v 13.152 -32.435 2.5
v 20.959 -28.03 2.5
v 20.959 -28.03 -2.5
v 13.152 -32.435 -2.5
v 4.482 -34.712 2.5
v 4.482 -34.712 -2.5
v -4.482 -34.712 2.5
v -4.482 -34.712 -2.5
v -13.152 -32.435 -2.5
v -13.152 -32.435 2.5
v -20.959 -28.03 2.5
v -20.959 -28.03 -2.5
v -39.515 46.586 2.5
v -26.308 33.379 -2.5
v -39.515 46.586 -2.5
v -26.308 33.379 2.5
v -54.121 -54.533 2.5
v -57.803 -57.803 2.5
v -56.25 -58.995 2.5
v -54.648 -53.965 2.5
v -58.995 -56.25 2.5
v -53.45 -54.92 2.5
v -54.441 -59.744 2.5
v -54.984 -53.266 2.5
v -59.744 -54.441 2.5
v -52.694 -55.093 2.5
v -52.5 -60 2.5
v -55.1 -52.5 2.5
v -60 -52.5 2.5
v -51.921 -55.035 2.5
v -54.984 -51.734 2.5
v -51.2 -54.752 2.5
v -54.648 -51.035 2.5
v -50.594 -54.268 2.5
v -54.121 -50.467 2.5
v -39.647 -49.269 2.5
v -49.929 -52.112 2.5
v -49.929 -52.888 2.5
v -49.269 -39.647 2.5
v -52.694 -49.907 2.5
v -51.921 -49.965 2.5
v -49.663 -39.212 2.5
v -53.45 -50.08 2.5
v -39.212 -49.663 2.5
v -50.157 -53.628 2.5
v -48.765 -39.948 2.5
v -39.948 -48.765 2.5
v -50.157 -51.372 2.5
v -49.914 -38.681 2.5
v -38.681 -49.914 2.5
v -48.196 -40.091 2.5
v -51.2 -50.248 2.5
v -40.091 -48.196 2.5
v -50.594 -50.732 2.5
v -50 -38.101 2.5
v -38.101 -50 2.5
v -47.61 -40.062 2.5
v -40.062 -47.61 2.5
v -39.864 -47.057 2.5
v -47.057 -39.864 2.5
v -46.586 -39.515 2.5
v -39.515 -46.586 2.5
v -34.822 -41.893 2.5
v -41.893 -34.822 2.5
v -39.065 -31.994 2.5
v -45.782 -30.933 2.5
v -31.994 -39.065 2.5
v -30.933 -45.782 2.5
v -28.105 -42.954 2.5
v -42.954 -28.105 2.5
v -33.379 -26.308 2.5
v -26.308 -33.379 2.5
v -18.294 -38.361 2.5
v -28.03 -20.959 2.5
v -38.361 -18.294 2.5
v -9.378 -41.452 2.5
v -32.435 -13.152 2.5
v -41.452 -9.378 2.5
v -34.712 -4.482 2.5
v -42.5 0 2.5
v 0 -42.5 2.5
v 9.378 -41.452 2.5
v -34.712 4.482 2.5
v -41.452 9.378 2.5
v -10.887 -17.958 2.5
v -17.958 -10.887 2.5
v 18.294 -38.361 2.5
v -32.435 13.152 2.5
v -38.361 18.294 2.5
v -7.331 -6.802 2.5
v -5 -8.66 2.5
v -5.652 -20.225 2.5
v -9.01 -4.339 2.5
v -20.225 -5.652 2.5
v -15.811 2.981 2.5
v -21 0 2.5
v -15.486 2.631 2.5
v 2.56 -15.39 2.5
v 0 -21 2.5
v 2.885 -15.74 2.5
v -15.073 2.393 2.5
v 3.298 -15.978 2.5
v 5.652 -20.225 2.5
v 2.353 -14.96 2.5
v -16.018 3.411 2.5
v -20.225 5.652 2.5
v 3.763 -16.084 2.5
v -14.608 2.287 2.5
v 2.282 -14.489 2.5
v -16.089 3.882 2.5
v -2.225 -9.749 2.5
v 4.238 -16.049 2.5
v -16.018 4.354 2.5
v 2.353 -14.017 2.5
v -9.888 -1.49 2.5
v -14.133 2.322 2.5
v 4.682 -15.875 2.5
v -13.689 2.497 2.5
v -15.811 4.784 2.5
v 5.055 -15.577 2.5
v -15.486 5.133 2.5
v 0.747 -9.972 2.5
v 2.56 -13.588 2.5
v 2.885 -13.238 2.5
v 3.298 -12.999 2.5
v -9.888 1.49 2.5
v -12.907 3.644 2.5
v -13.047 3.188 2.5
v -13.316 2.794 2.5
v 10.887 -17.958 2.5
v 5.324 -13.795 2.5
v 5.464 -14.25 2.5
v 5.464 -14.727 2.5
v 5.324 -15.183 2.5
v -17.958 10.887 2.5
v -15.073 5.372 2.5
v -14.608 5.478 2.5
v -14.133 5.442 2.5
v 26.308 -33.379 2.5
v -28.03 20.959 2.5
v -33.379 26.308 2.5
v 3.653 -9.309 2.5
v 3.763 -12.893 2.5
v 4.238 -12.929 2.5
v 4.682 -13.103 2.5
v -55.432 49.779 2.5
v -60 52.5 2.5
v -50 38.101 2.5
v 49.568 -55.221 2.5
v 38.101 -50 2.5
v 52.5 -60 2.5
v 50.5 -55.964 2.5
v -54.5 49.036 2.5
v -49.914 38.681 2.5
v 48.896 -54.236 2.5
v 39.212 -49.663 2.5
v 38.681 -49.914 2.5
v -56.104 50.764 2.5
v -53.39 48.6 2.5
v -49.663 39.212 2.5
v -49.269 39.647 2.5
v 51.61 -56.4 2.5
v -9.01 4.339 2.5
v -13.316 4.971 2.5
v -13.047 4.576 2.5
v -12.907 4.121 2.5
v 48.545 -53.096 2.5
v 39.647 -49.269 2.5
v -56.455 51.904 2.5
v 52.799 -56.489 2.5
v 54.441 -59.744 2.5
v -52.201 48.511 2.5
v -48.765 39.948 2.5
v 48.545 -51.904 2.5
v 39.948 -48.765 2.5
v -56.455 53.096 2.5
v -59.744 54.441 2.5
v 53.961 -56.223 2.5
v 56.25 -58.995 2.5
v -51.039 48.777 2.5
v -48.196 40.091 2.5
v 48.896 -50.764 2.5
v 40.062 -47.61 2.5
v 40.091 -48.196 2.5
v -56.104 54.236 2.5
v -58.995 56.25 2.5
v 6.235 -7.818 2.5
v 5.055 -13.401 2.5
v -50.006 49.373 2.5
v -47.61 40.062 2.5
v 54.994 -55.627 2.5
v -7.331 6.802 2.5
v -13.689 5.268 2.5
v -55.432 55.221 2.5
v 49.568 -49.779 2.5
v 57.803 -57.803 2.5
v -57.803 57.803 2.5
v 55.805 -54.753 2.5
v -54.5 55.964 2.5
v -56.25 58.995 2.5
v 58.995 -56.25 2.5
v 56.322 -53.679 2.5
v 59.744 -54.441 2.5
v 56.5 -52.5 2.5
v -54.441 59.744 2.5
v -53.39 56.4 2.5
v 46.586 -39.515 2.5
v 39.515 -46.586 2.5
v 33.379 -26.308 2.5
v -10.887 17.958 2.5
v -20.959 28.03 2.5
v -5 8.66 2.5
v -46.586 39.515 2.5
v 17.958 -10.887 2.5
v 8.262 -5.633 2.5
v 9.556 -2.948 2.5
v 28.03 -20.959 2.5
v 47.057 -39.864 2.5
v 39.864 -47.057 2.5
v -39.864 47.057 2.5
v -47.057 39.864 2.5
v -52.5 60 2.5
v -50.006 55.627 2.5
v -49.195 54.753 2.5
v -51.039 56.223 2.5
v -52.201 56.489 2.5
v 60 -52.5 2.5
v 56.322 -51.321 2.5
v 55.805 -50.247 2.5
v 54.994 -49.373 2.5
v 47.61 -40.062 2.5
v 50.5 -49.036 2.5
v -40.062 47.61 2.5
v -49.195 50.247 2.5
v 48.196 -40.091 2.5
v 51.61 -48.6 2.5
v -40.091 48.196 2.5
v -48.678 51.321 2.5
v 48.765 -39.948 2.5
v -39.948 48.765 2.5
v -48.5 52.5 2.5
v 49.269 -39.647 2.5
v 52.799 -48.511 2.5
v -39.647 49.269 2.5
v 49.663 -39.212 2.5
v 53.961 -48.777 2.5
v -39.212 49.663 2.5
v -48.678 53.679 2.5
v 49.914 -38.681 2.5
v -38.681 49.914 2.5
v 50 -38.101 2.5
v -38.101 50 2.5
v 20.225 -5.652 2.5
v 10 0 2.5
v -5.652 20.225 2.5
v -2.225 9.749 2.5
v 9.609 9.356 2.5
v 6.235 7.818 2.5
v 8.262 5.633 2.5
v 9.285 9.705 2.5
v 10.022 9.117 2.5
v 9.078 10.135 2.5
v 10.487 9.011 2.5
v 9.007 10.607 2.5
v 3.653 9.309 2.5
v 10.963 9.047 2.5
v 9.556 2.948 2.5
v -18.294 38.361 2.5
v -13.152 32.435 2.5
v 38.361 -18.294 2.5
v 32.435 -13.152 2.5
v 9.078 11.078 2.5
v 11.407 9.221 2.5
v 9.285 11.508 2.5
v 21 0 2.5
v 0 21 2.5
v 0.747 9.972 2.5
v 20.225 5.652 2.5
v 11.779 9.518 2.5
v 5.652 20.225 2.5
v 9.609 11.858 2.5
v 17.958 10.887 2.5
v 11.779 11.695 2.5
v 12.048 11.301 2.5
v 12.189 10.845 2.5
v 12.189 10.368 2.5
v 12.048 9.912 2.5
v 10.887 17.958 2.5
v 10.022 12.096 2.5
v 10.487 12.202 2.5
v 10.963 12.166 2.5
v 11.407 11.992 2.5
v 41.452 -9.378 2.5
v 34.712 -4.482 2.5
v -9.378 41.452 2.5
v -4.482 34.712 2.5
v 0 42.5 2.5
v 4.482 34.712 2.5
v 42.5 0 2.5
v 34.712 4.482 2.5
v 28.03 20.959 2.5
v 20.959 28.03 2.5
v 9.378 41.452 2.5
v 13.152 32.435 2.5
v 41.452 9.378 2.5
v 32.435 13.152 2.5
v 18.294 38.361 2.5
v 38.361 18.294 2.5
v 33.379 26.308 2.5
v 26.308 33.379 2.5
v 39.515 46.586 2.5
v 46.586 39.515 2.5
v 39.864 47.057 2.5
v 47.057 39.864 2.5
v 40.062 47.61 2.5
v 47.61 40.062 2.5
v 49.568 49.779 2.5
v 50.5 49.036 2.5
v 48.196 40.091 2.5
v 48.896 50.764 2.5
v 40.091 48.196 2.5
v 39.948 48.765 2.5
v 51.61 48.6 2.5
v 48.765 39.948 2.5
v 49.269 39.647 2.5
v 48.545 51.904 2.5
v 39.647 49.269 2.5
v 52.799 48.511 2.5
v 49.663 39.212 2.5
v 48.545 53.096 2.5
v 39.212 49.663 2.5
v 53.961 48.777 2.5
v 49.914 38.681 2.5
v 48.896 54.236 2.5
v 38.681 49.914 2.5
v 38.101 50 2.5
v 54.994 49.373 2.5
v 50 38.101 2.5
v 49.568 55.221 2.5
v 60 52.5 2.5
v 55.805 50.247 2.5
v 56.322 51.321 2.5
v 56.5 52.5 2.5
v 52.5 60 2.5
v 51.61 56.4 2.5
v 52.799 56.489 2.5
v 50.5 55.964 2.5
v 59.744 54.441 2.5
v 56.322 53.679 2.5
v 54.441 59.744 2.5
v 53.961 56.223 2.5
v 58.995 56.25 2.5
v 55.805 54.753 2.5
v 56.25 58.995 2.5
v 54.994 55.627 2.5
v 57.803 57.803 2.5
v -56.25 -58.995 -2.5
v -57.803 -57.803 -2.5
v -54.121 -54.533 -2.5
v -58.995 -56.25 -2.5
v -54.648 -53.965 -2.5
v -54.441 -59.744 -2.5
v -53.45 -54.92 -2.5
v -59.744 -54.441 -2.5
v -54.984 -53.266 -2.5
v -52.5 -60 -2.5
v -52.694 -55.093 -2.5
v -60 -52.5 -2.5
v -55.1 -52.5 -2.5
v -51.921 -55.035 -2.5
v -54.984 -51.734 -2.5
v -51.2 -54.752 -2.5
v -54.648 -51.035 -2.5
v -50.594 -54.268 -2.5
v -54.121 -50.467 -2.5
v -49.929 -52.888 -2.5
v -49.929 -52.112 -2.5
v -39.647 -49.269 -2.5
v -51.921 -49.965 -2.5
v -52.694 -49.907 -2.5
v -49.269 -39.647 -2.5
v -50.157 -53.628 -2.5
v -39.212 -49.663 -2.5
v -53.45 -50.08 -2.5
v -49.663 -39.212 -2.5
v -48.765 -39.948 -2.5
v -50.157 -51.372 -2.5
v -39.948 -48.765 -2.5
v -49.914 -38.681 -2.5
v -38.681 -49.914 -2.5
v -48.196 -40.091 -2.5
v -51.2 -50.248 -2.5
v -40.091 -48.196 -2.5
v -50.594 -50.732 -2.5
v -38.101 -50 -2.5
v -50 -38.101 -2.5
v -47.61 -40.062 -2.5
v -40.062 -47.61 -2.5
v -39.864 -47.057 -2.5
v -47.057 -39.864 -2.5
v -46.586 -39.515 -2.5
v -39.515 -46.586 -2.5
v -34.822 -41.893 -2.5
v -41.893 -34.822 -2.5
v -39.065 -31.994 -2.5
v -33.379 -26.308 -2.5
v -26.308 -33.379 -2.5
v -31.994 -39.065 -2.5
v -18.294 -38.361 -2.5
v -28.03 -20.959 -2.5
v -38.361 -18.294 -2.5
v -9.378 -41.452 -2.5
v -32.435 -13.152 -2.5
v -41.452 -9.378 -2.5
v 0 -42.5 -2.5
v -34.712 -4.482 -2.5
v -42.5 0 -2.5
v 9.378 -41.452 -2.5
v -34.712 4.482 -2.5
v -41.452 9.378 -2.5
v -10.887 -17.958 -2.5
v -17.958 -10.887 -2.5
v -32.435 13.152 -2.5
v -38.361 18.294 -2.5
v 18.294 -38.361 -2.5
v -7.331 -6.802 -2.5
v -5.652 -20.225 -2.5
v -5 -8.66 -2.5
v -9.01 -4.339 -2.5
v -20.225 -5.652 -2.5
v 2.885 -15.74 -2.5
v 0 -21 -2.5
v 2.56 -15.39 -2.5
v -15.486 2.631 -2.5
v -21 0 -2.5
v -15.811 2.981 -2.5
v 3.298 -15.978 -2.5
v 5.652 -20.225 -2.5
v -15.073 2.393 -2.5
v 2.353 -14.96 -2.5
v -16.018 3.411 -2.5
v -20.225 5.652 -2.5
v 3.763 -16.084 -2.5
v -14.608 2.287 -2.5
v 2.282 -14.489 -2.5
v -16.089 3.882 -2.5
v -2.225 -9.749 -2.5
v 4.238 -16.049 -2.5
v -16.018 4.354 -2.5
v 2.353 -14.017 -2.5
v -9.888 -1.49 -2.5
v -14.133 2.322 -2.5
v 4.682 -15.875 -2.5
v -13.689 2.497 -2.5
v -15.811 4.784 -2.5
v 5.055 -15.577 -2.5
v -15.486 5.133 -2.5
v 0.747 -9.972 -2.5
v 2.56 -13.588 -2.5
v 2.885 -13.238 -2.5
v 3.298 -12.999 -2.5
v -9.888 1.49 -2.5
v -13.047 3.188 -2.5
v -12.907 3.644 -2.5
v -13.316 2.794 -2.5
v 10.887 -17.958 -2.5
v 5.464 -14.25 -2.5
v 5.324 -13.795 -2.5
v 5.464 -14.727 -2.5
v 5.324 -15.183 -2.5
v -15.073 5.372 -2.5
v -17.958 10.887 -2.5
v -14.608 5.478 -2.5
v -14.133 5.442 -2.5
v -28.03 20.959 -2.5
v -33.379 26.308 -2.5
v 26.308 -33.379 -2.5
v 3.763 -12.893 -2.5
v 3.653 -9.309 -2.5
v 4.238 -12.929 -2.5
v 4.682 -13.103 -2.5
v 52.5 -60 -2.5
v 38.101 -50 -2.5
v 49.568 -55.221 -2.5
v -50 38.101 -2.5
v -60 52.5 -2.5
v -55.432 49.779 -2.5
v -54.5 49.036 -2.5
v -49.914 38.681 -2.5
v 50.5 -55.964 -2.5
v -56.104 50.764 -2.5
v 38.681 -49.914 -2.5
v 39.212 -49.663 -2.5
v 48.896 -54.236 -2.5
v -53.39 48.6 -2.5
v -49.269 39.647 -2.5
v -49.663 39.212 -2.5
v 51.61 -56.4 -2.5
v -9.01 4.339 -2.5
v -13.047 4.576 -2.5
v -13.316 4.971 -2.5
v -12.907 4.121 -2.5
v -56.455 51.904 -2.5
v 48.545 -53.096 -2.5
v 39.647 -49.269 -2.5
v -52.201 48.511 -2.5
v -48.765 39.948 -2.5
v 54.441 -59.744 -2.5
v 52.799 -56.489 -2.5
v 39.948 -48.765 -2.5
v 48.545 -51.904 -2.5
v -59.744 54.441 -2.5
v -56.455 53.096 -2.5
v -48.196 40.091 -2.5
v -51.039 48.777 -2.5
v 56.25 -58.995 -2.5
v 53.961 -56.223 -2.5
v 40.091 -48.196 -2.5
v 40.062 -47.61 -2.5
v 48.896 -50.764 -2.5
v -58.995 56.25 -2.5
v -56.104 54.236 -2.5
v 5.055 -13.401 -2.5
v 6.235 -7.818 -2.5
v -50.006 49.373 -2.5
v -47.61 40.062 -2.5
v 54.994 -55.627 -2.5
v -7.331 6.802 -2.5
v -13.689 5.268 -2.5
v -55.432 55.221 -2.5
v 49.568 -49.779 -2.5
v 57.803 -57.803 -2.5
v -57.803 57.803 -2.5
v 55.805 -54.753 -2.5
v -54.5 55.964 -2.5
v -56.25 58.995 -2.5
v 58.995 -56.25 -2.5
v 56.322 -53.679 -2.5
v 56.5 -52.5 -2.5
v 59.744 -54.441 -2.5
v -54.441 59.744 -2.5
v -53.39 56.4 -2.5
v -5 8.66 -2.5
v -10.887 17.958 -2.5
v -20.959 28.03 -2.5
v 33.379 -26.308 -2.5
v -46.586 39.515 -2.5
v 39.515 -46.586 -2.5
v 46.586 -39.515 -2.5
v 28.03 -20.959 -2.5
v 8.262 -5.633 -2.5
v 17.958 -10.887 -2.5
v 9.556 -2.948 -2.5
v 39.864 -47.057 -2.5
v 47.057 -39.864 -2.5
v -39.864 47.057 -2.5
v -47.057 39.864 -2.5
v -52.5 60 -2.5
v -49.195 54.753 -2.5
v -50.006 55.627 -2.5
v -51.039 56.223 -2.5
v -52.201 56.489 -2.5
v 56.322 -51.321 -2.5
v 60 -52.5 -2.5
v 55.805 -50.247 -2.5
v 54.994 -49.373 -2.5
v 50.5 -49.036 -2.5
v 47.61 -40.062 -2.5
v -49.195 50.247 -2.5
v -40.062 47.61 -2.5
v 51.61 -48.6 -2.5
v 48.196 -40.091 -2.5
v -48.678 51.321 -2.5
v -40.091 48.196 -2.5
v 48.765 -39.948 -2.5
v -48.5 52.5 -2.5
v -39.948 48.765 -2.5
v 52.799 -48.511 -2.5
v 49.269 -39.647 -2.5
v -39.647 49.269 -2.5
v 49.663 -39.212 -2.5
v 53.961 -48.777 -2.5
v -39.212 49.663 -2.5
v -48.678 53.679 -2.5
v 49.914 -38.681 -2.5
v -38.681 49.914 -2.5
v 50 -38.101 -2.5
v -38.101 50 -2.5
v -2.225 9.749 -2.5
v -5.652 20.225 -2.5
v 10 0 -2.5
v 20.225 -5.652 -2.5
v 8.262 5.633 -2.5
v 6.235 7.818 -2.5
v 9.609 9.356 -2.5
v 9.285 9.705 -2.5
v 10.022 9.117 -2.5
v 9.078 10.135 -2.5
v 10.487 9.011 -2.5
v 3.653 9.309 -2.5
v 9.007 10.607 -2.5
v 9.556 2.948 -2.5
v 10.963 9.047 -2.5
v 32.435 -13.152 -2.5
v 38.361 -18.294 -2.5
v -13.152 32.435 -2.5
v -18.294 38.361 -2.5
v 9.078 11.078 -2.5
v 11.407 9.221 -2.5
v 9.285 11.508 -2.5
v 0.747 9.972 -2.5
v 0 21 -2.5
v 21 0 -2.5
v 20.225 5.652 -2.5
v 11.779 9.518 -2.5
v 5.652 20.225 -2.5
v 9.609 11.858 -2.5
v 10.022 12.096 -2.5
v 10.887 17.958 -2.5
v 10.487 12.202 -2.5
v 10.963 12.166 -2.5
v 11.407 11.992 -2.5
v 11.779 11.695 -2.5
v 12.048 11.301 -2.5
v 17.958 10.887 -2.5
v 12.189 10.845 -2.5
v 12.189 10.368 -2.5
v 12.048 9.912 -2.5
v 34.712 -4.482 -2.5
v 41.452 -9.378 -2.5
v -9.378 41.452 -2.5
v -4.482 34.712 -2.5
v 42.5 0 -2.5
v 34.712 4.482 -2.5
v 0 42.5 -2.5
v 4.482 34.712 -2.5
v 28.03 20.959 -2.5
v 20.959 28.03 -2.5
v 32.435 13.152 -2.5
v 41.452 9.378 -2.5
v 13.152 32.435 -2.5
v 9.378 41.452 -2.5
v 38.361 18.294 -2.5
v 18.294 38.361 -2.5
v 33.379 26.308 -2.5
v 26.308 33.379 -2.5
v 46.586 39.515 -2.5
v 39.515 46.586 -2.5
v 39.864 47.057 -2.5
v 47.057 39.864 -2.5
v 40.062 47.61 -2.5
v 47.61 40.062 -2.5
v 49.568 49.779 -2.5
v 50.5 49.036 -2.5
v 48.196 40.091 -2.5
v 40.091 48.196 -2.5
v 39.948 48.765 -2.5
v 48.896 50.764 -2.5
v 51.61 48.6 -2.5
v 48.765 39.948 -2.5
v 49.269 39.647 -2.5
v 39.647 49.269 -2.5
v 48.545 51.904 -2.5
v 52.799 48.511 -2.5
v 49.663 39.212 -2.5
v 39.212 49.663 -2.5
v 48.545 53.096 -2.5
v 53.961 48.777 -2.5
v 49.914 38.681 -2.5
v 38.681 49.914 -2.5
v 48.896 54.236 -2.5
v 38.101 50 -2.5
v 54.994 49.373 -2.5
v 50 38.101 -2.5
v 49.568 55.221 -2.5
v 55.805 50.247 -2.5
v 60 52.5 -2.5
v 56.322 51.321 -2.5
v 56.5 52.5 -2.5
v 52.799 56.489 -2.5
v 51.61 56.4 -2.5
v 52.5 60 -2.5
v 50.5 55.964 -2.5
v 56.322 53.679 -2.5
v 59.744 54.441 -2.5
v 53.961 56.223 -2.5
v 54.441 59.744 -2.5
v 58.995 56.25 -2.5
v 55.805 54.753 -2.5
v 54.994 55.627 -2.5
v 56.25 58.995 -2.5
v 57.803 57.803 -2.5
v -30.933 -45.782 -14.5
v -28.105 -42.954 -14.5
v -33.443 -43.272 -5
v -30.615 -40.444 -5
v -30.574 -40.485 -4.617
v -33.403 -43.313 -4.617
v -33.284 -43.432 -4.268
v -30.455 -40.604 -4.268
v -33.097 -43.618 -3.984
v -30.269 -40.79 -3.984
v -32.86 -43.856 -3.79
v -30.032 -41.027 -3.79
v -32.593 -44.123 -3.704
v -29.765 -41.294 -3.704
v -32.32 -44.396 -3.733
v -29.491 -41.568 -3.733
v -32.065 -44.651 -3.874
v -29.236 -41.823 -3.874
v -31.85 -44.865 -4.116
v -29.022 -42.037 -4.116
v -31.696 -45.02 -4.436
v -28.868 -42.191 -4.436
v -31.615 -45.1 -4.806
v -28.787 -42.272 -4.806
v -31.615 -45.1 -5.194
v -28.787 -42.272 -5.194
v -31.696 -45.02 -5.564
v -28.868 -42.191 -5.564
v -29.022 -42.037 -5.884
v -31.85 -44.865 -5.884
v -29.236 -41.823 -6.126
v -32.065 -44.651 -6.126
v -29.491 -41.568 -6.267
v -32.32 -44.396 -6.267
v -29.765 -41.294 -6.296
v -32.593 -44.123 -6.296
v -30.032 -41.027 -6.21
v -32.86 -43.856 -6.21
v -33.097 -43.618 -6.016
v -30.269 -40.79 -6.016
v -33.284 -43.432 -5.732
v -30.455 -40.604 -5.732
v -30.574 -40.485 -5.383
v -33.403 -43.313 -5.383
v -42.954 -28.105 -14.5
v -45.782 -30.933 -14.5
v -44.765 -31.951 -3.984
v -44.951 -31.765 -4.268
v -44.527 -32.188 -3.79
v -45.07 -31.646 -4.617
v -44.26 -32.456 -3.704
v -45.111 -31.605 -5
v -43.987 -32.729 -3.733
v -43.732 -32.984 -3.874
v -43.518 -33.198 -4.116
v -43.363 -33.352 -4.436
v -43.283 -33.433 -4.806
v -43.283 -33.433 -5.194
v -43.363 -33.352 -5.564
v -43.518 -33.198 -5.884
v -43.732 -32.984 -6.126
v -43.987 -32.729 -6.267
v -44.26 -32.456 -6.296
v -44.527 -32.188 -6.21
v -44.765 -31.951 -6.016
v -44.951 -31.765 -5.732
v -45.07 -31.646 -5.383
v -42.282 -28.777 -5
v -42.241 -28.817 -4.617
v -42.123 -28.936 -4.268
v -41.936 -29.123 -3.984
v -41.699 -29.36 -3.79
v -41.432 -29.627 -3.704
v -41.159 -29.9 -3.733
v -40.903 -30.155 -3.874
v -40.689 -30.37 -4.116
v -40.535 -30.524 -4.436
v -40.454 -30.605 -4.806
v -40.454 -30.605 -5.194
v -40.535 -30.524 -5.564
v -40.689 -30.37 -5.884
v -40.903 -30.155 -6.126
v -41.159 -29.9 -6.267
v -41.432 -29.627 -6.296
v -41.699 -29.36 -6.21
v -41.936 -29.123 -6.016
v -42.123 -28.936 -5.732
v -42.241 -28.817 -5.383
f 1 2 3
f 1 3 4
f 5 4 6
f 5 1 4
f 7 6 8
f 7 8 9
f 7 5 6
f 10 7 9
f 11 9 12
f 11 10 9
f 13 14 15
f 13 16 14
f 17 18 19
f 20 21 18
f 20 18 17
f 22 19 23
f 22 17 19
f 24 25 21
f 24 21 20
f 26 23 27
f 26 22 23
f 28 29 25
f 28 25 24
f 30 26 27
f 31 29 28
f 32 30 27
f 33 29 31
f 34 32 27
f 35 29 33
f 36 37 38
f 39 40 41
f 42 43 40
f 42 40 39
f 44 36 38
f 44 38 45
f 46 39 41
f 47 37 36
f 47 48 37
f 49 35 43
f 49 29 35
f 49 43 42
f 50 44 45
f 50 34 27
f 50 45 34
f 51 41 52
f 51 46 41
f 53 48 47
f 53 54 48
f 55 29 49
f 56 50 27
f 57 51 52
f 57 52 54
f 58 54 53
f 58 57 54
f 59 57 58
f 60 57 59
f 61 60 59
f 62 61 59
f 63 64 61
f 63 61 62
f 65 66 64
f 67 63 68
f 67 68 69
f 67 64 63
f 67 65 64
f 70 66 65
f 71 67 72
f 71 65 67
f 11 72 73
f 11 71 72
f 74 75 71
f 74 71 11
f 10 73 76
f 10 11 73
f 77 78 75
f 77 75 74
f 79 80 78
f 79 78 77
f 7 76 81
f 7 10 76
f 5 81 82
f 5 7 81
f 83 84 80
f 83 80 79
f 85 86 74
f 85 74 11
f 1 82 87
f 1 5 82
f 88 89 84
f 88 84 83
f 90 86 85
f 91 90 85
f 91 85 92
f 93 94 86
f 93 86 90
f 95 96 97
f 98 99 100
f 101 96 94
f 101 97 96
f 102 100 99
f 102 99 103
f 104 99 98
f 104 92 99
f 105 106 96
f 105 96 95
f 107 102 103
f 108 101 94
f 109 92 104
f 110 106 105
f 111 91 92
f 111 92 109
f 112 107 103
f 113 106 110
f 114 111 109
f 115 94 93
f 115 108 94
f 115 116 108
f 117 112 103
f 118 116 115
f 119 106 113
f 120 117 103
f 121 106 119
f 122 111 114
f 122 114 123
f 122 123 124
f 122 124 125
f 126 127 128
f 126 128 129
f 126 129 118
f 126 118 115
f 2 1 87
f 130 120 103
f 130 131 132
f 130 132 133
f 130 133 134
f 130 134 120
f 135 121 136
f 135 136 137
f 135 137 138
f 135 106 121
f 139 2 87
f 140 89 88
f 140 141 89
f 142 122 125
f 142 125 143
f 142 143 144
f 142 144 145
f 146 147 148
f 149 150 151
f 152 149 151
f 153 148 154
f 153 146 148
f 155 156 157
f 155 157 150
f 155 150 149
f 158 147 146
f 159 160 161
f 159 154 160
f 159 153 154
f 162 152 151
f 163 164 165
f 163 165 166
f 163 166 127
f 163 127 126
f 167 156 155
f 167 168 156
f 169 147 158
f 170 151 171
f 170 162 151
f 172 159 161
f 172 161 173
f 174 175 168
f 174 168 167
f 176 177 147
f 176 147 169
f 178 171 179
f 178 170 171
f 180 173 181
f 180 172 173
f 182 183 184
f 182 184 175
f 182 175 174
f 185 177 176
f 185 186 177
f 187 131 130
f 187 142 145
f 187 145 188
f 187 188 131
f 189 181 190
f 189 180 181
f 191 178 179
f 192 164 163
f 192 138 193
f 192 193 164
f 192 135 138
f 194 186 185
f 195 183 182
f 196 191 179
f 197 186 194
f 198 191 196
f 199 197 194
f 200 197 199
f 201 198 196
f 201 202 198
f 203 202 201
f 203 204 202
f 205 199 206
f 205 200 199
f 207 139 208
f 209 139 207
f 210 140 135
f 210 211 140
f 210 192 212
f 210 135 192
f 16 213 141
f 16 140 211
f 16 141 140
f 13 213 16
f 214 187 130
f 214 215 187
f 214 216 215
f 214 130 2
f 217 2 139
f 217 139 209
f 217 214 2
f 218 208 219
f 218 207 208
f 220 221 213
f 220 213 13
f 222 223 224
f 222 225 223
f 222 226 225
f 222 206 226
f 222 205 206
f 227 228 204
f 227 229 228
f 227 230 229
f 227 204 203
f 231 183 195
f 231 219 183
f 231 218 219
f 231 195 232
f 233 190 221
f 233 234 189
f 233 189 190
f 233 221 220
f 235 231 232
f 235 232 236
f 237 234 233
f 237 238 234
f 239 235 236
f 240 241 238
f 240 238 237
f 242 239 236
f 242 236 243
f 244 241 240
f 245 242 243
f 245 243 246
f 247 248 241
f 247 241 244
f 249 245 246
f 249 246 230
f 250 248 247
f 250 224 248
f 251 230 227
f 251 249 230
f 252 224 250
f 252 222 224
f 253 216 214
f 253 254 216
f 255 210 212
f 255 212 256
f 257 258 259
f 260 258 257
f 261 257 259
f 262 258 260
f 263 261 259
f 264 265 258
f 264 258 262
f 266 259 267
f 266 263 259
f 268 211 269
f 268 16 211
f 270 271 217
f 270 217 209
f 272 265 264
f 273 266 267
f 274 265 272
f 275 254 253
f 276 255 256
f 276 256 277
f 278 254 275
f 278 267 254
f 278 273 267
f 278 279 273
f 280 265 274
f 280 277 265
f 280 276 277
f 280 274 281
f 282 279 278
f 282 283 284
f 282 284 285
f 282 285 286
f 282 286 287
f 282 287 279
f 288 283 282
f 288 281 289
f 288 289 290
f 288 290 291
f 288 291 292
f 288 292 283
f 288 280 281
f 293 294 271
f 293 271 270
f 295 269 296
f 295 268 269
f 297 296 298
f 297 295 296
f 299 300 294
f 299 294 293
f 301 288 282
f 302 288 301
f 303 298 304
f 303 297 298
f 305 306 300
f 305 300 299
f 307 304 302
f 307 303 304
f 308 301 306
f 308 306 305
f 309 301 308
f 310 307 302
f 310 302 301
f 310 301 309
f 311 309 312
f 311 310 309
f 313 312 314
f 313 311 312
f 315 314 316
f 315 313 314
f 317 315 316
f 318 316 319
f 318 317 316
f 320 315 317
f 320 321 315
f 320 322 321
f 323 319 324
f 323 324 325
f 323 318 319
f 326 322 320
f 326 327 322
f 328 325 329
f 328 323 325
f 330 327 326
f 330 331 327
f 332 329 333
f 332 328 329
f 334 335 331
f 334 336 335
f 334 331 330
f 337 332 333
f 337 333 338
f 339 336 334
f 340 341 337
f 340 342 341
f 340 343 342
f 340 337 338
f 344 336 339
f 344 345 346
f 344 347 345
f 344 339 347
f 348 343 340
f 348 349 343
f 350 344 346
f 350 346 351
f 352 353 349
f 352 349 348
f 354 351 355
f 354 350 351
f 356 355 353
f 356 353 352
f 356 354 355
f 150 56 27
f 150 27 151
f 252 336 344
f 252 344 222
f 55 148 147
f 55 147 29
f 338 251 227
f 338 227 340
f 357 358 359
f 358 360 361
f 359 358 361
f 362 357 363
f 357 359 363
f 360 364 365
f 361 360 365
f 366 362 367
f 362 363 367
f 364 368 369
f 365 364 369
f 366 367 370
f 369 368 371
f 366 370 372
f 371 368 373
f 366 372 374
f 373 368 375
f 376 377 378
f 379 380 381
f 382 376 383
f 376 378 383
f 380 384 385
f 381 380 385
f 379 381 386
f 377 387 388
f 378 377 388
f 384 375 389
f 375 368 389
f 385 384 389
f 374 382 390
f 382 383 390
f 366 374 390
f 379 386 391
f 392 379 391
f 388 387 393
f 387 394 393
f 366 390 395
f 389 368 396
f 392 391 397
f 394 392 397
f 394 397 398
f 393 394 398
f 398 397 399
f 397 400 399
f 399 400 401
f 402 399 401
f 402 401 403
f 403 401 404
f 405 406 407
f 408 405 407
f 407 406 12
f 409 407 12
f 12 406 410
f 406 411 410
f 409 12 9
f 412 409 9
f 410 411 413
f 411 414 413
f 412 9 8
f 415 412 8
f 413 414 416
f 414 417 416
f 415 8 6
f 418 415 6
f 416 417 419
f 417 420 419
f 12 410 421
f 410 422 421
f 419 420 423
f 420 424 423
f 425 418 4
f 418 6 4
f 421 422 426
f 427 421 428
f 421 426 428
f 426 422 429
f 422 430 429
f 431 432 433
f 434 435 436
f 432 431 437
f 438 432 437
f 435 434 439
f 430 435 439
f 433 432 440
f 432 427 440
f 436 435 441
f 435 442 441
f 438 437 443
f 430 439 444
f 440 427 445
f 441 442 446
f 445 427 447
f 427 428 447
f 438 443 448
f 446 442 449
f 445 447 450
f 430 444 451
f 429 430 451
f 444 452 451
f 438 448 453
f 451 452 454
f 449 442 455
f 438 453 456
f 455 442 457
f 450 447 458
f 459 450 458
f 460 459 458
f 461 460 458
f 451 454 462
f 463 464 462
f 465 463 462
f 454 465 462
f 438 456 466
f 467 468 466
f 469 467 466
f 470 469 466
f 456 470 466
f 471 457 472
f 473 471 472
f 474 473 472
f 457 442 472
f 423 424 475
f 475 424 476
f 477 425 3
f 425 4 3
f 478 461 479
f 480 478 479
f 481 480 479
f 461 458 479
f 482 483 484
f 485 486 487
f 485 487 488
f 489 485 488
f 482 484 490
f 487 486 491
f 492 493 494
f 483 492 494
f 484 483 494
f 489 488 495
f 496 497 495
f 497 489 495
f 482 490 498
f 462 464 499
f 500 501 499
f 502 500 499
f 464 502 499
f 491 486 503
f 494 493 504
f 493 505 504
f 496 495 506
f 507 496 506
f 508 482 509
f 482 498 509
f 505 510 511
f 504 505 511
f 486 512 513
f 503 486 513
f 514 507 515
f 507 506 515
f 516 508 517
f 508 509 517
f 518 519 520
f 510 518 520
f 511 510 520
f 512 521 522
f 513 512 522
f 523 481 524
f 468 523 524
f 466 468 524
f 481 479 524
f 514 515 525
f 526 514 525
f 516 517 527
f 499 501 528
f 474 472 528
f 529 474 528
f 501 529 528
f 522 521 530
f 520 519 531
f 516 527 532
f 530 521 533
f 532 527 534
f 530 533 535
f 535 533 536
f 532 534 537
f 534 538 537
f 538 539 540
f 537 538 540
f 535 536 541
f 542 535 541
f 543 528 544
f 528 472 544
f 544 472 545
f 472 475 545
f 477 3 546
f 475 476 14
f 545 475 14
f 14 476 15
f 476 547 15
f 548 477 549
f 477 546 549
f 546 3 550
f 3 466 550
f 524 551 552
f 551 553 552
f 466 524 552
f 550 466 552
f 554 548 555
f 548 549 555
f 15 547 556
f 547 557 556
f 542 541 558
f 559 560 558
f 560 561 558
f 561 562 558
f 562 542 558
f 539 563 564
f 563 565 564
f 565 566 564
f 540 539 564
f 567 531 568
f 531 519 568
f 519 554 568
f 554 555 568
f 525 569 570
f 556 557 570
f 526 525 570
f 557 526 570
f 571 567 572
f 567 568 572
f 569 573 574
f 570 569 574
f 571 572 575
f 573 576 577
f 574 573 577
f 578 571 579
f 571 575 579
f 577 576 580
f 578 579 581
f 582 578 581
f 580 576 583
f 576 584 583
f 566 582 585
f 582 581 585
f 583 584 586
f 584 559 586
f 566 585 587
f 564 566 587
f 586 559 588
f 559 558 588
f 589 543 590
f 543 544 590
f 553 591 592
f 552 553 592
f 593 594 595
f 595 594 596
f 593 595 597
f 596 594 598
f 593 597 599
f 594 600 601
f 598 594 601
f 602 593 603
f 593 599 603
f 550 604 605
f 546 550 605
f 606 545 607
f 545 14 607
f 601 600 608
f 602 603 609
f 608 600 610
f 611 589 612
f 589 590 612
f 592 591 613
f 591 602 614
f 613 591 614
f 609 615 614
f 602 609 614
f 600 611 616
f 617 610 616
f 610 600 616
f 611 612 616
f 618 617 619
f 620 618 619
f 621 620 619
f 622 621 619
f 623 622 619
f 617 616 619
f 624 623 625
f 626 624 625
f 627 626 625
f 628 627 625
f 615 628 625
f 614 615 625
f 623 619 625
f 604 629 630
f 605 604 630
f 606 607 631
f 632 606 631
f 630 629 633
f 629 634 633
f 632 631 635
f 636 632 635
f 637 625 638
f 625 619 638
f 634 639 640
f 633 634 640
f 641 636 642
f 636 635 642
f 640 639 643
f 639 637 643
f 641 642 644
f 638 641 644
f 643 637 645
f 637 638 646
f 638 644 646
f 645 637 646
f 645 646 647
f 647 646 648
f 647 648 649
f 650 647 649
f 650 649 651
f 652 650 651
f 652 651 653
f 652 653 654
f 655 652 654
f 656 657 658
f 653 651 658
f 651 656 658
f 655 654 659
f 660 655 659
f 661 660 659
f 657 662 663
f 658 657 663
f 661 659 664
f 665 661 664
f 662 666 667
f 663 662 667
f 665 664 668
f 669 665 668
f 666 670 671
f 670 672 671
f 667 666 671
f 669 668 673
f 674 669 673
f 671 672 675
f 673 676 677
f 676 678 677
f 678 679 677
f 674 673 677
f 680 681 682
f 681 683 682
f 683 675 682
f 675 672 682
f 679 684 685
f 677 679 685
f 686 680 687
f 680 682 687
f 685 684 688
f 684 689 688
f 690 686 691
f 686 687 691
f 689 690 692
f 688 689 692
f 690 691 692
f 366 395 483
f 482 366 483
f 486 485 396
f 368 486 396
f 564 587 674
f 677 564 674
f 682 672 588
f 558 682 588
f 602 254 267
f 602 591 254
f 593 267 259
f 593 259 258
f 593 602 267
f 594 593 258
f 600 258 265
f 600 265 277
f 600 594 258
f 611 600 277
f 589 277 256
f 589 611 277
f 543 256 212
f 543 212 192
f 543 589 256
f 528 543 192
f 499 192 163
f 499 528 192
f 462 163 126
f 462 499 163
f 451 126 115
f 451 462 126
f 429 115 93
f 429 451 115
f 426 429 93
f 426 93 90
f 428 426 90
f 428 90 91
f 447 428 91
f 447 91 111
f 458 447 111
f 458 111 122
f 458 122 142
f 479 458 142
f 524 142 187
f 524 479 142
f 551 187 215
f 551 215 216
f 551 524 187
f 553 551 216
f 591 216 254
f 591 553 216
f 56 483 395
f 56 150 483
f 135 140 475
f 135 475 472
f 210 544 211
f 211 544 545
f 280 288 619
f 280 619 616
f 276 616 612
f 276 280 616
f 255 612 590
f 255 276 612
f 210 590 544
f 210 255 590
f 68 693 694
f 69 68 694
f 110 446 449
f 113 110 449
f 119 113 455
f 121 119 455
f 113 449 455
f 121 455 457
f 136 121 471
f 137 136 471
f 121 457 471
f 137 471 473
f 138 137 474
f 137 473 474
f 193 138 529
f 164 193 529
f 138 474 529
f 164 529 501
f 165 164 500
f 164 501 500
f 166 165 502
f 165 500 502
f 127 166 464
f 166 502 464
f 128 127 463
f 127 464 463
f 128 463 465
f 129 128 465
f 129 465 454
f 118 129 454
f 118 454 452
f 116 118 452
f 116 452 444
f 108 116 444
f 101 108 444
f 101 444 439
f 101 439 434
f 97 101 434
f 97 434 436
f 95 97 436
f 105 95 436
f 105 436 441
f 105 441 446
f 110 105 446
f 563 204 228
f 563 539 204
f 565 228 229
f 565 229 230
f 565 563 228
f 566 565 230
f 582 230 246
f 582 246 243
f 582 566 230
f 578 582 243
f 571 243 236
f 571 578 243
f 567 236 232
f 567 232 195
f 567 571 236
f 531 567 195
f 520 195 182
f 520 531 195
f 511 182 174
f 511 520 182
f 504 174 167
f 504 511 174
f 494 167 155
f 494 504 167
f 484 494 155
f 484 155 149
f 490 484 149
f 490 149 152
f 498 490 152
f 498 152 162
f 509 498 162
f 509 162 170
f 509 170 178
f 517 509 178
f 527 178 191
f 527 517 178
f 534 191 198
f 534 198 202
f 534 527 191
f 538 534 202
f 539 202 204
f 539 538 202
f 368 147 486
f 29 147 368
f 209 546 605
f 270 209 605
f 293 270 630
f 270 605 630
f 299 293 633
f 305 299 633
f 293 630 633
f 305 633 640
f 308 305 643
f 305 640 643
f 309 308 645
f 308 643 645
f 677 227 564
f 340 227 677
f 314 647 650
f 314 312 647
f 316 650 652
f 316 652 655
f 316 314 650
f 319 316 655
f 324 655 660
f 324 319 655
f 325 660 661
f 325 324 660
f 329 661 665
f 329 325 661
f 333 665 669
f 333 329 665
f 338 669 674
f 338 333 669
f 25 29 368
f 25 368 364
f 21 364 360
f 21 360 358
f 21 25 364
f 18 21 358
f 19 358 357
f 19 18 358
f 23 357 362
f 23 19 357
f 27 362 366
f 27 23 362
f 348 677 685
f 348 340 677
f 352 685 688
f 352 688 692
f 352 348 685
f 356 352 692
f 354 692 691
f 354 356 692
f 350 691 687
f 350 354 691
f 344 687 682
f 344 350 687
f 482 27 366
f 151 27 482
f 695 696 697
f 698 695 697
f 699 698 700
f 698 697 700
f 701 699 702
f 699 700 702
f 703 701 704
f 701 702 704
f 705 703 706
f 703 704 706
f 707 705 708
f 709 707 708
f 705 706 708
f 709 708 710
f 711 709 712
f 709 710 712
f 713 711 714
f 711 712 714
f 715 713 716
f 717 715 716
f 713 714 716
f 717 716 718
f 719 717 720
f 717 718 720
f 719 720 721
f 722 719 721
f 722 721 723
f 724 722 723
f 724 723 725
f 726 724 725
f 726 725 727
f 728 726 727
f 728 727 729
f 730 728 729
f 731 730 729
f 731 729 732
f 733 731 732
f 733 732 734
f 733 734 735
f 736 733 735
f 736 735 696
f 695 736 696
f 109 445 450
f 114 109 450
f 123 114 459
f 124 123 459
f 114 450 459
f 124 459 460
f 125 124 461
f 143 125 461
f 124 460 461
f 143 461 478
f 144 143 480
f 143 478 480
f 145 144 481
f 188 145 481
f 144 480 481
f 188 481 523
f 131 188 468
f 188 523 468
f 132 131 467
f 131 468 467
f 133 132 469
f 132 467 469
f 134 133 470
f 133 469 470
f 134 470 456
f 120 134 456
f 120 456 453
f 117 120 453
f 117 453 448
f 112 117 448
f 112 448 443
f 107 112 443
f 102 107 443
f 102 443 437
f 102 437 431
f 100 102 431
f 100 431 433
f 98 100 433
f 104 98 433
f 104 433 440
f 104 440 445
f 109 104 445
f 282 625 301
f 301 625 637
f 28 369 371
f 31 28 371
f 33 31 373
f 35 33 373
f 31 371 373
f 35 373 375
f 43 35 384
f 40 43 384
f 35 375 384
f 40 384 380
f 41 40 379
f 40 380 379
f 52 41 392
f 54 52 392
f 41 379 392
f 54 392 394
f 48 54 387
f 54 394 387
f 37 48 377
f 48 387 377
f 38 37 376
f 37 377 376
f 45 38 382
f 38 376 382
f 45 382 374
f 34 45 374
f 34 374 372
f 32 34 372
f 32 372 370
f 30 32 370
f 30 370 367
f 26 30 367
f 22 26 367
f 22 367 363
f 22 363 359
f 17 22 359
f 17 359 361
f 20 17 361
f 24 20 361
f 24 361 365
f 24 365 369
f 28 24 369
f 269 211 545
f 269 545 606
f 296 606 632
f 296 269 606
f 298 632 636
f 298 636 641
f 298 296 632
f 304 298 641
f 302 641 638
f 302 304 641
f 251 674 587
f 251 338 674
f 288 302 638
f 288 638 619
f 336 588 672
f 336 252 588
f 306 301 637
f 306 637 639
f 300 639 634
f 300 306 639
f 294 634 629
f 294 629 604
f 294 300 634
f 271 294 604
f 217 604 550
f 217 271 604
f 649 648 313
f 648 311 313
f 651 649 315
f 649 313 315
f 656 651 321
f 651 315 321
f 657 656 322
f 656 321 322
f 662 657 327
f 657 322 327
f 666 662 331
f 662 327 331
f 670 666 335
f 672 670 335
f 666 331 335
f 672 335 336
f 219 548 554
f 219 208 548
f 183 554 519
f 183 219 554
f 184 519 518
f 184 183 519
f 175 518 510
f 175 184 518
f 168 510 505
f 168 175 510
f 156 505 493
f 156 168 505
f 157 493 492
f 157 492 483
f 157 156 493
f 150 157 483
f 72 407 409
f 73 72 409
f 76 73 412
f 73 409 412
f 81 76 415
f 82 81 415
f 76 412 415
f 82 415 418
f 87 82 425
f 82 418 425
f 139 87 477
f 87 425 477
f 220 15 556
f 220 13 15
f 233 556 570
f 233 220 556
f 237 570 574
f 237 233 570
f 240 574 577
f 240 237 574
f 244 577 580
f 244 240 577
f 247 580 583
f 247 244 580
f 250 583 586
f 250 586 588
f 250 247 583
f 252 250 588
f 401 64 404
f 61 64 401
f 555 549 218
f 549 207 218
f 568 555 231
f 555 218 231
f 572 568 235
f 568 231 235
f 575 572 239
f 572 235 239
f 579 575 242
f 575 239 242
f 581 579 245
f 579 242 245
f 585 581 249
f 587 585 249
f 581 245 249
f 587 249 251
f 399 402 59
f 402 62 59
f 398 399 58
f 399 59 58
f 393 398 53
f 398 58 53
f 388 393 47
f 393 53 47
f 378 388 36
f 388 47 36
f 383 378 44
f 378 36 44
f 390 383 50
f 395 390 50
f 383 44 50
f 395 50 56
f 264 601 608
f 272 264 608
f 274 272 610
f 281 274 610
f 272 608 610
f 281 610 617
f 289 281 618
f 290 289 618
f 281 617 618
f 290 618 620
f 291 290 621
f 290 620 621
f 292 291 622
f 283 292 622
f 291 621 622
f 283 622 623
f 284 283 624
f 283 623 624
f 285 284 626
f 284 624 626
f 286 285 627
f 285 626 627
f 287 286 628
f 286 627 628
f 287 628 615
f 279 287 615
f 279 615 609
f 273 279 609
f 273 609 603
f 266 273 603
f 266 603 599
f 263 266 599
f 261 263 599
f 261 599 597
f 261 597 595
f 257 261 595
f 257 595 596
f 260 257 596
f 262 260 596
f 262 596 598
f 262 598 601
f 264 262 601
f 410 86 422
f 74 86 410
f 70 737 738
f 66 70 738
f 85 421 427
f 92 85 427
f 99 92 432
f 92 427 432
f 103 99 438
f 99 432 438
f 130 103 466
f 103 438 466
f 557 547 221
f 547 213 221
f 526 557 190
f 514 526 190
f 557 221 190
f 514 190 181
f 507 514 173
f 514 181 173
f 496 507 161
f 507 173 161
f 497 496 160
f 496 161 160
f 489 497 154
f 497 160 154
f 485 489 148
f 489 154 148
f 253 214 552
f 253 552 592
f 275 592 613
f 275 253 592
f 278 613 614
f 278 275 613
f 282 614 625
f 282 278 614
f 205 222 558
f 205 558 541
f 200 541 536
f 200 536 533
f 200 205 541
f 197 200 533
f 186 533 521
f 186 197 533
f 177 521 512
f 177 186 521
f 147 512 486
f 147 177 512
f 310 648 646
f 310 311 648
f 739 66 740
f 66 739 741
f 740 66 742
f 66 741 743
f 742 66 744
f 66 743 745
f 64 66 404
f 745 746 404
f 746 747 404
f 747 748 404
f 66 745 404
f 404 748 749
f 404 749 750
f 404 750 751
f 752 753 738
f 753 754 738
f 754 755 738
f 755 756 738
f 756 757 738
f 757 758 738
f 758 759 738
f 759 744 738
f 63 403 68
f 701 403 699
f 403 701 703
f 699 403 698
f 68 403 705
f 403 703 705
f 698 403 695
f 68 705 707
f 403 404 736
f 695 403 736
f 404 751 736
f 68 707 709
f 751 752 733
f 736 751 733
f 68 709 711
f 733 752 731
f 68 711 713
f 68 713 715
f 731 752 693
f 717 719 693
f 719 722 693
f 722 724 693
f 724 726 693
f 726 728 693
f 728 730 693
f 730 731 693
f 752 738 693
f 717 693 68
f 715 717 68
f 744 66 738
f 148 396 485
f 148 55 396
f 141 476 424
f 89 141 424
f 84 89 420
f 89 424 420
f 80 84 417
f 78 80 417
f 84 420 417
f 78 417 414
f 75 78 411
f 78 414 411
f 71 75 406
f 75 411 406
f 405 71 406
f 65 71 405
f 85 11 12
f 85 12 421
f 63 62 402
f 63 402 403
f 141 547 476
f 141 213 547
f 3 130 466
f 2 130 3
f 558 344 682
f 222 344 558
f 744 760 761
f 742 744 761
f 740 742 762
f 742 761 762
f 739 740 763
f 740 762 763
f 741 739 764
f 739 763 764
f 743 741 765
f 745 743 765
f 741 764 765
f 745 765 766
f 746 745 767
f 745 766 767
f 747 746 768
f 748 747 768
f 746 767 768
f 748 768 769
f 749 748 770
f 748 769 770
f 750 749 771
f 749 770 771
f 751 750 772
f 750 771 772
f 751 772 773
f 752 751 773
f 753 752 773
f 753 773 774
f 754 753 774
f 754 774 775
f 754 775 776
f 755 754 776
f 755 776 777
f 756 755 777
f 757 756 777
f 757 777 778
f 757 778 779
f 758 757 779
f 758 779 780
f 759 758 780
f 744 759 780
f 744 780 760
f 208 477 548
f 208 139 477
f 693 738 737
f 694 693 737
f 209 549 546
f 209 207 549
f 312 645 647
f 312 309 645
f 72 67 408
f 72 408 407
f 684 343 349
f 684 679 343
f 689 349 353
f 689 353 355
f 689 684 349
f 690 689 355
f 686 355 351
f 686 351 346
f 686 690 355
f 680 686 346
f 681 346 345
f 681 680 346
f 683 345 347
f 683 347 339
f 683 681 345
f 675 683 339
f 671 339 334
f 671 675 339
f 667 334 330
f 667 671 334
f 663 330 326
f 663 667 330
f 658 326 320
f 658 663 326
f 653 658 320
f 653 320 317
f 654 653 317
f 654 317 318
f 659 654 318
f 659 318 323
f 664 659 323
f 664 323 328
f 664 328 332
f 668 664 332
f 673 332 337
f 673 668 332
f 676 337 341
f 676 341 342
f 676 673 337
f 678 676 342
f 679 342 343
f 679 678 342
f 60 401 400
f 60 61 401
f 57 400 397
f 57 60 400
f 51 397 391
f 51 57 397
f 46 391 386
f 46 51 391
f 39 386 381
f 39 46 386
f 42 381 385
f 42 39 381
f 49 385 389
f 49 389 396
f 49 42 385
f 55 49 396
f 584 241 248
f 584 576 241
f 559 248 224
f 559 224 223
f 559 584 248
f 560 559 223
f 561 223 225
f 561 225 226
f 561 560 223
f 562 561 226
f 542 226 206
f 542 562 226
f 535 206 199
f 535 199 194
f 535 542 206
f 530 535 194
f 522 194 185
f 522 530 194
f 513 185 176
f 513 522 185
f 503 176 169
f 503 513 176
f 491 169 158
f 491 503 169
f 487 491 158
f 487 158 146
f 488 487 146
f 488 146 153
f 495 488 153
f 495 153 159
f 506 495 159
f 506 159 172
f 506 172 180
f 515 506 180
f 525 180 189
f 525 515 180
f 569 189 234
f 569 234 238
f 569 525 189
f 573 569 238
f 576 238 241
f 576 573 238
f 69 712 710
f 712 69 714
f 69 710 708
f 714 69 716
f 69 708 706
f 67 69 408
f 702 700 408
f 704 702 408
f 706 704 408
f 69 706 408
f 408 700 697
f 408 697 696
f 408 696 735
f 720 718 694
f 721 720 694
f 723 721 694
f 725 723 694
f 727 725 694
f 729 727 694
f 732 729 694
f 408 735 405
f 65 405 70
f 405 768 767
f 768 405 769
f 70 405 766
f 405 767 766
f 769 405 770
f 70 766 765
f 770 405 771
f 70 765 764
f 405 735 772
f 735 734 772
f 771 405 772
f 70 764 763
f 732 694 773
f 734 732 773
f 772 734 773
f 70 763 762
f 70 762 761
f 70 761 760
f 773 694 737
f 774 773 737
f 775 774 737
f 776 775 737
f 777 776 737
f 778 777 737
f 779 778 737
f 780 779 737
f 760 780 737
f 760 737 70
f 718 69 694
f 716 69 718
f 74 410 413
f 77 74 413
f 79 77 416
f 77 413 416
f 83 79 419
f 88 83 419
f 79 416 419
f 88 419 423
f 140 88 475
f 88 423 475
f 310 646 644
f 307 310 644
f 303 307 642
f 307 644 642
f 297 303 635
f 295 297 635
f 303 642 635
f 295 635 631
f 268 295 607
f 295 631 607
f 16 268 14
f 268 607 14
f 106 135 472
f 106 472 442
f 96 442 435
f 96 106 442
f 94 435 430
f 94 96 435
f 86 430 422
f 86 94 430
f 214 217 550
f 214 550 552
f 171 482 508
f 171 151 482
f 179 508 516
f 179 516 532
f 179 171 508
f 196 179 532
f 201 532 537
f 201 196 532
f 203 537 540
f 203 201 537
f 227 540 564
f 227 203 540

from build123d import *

# Parameters (mm, degrees)
SKETCH1_R                  = 4
SKETCH1_R_2                = 10
EXTRUDE1_DEPTH             = 2.5
FILLET1_R                  = 2
EXTRUDE5_REACH             = 87
SKETCH6_R                  = 1.6
EXTRUDE6_START             = -5
SKETCH7_R                  = 4
EXTRUDE6_DEPTH             = 5
SKETCH10_R                 = 2.6
EXTRUDE7_DEPTH             = 10
EXTRUDE8_DEPTH             = 12
EXTRUDE8_DIRECTION_2_REACH = 87
SKETCH12_R                 = 1.3
EXTRUDE9_DEPTH             = 10


with BuildPart() as part:
    # Sketch1 → Extrude1 (new, symmetric)
    with BuildSketch(Plane.XY):
        with BuildLine():
            Line((52.5, 60), (-52.5, 60))
            ThreePointArc((-52.5, 60), (-57.803300859, 57.803300859), (-60, 52.5))
            Line((-60, 52.5), (-60, -52.5))
            ThreePointArc((-60, -52.5), (-57.803300859, -57.803300859), (-52.5, -60))
            Line((-52.5, -60), (52.5, -60))
            ThreePointArc((52.5, -60), (57.803300859, -57.803300859), (60, -52.5))
            Line((60, -52.5), (60, 52.5))
            ThreePointArc((60, 52.5), (57.803300859, 57.803300859), (52.5, 60))
        make_face()
        with BuildLine():
            Line((-50, 42.928932188), (-33.378874872, 26.30780706))
            ThreePointArc((-33.378874872, 26.30780706), (-42.5, 0), (-33.378874872, -26.30780706))
            Line((-33.378874872, -26.30780706), (-50, -42.928932188))
            Line((-50, -42.928932188), (-50, 42.928932188))
        make_face(mode=Mode.SUBTRACT)
        with Locations((-52.5, -52.5)):
            Circle(SKETCH1_R, mode=Mode.SUBTRACT)
        with BuildLine():
            Line((-42.928932188, -50), (-26.30780706, -33.378874872))
            ThreePointArc((-26.30780706, -33.378874872), (0, -42.5), (26.30780706, -33.378874872))
            Line((26.30780706, -33.378874872), (42.928932188, -50))
            Line((42.928932188, -50), (-42.928932188, -50))
        make_face(mode=Mode.SUBTRACT)
        with Locations((52.5, -52.5)):
            Circle(SKETCH1_R, mode=Mode.SUBTRACT)
        with BuildLine():
            Line((50, -42.928932188), (33.378874872, -26.30780706))
            ThreePointArc((33.378874872, -26.30780706), (42.5, 0), (33.378874872, 26.30780706))
            Line((33.378874872, 26.30780706), (50, 42.928932188))
            Line((50, 42.928932188), (50, -42.928932188))
        make_face(mode=Mode.SUBTRACT)
        with Locations((52.5, 52.5)):
            Circle(SKETCH1_R, mode=Mode.SUBTRACT)
        with BuildLine():
            Line((42.928932188, 50), (26.30780706, 33.378874872))
            ThreePointArc((26.30780706, 33.378874872), (0, 42.5), (-26.30780706, 33.378874872))
            Line((-26.30780706, 33.378874872), (-42.928932188, 50))
            Line((-42.928932188, 50), (42.928932188, 50))
        make_face(mode=Mode.SUBTRACT)
        with Locations((-52.5, 52.5)):
            Circle(SKETCH1_R, mode=Mode.SUBTRACT)
        with BuildLine():
            Line((-20.959363522, -28.030431334), (-10.886671196, -17.957739008))
            ThreePointArc((-10.886671196, -17.957739008), (0, -21), (10.886671196, -17.957739008))
            Line((10.886671196, -17.957739008), (20.959363522, -28.030431334))
            ThreePointArc((20.959363522, -28.030431334), (0, -35), (-20.959363522, -28.030431334))
        make_face(mode=Mode.SUBTRACT)
        with BuildLine():
            ThreePointArc((17.957739008, -10.886671196), (21, 0), (17.957739008, 10.886671196))
            Line((17.957739008, 10.886671196), (28.030431334, 20.959363522))
            ThreePointArc((28.030431334, 20.959363522), (35, 0), (28.030431334, -20.959363522))
            Line((28.030431334, -20.959363522), (17.957739008, -10.886671196))
        make_face(mode=Mode.SUBTRACT)
        with BuildLine():
            ThreePointArc((10.886671196, 17.957739008), (0, 21), (-10.886671196, 17.957739008))
            Line((-10.886671196, 17.957739008), (-20.959363522, 28.030431334))
            ThreePointArc((-20.959363522, 28.030431334), (0, 35), (20.959363522, 28.030431334))
            Line((20.959363522, 28.030431334), (10.886671196, 17.957739008))
        make_face(mode=Mode.SUBTRACT)
        with BuildLine():
            Line((-17.957739008, -10.886671196), (-28.030431334, -20.959363522))
            ThreePointArc((-28.030431334, -20.959363522), (-35, 0), (-28.030431334, 20.959363522))
            Line((-28.030431334, 20.959363522), (-17.957739008, 10.886671196))
            ThreePointArc((-17.957739008, 10.886671196), (-21, 0), (-17.957739008, -10.886671196))
        make_face(mode=Mode.SUBTRACT)
        Circle(SKETCH1_R_2, mode=Mode.SUBTRACT)
    extrude(amount=EXTRUDE1_DEPTH, both=True)

    # Fillet1
    fillet1_edges = [part.edges().sort_by_distance(p)[0] for p in [
        (50, 42.928932188, 0),
        (50, -42.928932188, 0),
        (42.928932188, 50, 0),
        (-42.928932188, 50, 0),
        (-50, 42.928932188, 0),
        (-50, -42.928932188, 0),
        (-42.928932188, -50, 0),
        (42.928932188, -50, 0),
    ]]
    fillet(fillet1_edges, radius=FILLET1_R)

    # Sketch6 → Extrude5 (cut, up to next)
    with BuildSketch(Plane(origin=(0, 0, -2.5), x_dir=(-1, 0, 0), z_dir=(0, 0, -1)), mode=Mode.PRIVATE) as extrude5_sk1:
        with Locations((-10.606601718, 10.606601718)):
            Circle(SKETCH6_R)
    extrude5_tool1 = extrude(extrude5_sk1.sketch, amount=-EXTRUDE5_REACH, mode=Mode.PRIVATE) & part.part
    # Sketch6 → Extrude5 (cut, up to next)
    with BuildSketch(Plane(origin=(0, 0, -2.5), x_dir=(-1, 0, 0), z_dir=(0, 0, -1)), mode=Mode.PRIVATE) as extrude5_sk2:
        with Locations((14.488887394, 3.882285677)):
            Circle(SKETCH6_R)
    extrude5_tool2 = extrude(extrude5_sk2.sketch, amount=-EXTRUDE5_REACH, mode=Mode.PRIVATE) & part.part
    # Sketch6 → Extrude5 (cut, up to next)
    with BuildSketch(Plane(origin=(0, 0, -2.5), x_dir=(-1, 0, 0), z_dir=(0, 0, -1)), mode=Mode.PRIVATE) as extrude5_sk3:
        with Locations((-3.882285677, -14.488887394)):
            Circle(SKETCH6_R)
    extrude5_tool3 = extrude(extrude5_sk3.sketch, amount=-EXTRUDE5_REACH, mode=Mode.PRIVATE) & part.part
    add(extrude5_tool1.solids().sort_by_distance((10.606602, 10.606602, -2.5))[0], mode=Mode.SUBTRACT)
    add(extrude5_tool2.solids().sort_by_distance((-14.488887, 3.882286, -2.5))[0], mode=Mode.SUBTRACT)
    add(extrude5_tool3.solids().sort_by_distance((3.882286, -14.488887, -2.5))[0], mode=Mode.SUBTRACT)

    # Sketch7 → Extrude6 (add)
    with BuildSketch(Plane.XY.offset(2.5).offset(EXTRUDE6_START)):
        with Locations((-52.5, -52.5)):
            Circle(SKETCH7_R)
    extrude(amount=EXTRUDE6_DEPTH)

    # Sketch10 → Extrude7 (cut)
    with BuildSketch(Plane(origin=(0, 0, -2.5), x_dir=(-1, 0, 0), z_dir=(0, 0, -1))):
        with Locations((52.5, -52.5)):
            Circle(SKETCH10_R)
    extrude(amount=-EXTRUDE7_DEPTH, mode=Mode.SUBTRACT)

    # Sketch11 → Extrude8 (add)
    with BuildSketch(Plane(origin=(0, 0, -2.5), x_dir=(-1, 0, 0), z_dir=(0, 0, -1))):
        Polygon((28.104816049, -42.954058454), (42.954058454, -28.104816049), (45.782485579, -30.933243174), (30.933243174, -45.782485579), align=None)
    extrude(amount=EXTRUDE8_DEPTH)

    # Extrude8 direction 2: up to this face of the body (flat: up to its plane)
    extrude8_direction_2_end = Plane(part.part.faces().sort_by_distance((0, 58.302943725, 2.5))[0])
    # Sketch11 → Extrude8 direction 2 (add, up to the picked face)
    with BuildSketch(Plane(origin=(0, 0, -2.5), x_dir=(-1, 0, 0), z_dir=(0, 0, -1)), mode=Mode.PRIVATE) as extrude8_direction_2_sk1:
        Polygon((28.104816049, -42.954058454), (42.954058454, -28.104816049), (45.782485579, -30.933243174), (30.933243174, -45.782485579), align=None)
    extrude8_direction_2_tool1 = split(extrude(extrude8_direction_2_sk1.sketch, amount=-EXTRUDE8_DIRECTION_2_REACH, mode=Mode.PRIVATE), bisect_by=extrude8_direction_2_end, keep=Keep.BOTH, mode=Mode.PRIVATE)
    add(extrude8_direction_2_tool1.solids().sort_by(Axis((-36.943651, -36.943651, -2.5), (0, 0, 1)))[0])

    # Sketch12 → Extrude9 (cut)
    with BuildSketch(Plane(origin=(-35.529437252, -35.529437252, 0), x_dir=(0, 0, -1), z_dir=(0.7071067811865501, 0.7071067811865449, 0))):
        with Locations(Location((5, -8.25, 0), (0, 0, 90))):
            Circle(SKETCH12_R)
        with Locations(Location((5, 8.25, 0), (0, 0, 90))):
            Circle(SKETCH12_R)
    extrude(amount=-EXTRUDE9_DEPTH, mode=Mode.SUBTRACT)


solid = part.part
